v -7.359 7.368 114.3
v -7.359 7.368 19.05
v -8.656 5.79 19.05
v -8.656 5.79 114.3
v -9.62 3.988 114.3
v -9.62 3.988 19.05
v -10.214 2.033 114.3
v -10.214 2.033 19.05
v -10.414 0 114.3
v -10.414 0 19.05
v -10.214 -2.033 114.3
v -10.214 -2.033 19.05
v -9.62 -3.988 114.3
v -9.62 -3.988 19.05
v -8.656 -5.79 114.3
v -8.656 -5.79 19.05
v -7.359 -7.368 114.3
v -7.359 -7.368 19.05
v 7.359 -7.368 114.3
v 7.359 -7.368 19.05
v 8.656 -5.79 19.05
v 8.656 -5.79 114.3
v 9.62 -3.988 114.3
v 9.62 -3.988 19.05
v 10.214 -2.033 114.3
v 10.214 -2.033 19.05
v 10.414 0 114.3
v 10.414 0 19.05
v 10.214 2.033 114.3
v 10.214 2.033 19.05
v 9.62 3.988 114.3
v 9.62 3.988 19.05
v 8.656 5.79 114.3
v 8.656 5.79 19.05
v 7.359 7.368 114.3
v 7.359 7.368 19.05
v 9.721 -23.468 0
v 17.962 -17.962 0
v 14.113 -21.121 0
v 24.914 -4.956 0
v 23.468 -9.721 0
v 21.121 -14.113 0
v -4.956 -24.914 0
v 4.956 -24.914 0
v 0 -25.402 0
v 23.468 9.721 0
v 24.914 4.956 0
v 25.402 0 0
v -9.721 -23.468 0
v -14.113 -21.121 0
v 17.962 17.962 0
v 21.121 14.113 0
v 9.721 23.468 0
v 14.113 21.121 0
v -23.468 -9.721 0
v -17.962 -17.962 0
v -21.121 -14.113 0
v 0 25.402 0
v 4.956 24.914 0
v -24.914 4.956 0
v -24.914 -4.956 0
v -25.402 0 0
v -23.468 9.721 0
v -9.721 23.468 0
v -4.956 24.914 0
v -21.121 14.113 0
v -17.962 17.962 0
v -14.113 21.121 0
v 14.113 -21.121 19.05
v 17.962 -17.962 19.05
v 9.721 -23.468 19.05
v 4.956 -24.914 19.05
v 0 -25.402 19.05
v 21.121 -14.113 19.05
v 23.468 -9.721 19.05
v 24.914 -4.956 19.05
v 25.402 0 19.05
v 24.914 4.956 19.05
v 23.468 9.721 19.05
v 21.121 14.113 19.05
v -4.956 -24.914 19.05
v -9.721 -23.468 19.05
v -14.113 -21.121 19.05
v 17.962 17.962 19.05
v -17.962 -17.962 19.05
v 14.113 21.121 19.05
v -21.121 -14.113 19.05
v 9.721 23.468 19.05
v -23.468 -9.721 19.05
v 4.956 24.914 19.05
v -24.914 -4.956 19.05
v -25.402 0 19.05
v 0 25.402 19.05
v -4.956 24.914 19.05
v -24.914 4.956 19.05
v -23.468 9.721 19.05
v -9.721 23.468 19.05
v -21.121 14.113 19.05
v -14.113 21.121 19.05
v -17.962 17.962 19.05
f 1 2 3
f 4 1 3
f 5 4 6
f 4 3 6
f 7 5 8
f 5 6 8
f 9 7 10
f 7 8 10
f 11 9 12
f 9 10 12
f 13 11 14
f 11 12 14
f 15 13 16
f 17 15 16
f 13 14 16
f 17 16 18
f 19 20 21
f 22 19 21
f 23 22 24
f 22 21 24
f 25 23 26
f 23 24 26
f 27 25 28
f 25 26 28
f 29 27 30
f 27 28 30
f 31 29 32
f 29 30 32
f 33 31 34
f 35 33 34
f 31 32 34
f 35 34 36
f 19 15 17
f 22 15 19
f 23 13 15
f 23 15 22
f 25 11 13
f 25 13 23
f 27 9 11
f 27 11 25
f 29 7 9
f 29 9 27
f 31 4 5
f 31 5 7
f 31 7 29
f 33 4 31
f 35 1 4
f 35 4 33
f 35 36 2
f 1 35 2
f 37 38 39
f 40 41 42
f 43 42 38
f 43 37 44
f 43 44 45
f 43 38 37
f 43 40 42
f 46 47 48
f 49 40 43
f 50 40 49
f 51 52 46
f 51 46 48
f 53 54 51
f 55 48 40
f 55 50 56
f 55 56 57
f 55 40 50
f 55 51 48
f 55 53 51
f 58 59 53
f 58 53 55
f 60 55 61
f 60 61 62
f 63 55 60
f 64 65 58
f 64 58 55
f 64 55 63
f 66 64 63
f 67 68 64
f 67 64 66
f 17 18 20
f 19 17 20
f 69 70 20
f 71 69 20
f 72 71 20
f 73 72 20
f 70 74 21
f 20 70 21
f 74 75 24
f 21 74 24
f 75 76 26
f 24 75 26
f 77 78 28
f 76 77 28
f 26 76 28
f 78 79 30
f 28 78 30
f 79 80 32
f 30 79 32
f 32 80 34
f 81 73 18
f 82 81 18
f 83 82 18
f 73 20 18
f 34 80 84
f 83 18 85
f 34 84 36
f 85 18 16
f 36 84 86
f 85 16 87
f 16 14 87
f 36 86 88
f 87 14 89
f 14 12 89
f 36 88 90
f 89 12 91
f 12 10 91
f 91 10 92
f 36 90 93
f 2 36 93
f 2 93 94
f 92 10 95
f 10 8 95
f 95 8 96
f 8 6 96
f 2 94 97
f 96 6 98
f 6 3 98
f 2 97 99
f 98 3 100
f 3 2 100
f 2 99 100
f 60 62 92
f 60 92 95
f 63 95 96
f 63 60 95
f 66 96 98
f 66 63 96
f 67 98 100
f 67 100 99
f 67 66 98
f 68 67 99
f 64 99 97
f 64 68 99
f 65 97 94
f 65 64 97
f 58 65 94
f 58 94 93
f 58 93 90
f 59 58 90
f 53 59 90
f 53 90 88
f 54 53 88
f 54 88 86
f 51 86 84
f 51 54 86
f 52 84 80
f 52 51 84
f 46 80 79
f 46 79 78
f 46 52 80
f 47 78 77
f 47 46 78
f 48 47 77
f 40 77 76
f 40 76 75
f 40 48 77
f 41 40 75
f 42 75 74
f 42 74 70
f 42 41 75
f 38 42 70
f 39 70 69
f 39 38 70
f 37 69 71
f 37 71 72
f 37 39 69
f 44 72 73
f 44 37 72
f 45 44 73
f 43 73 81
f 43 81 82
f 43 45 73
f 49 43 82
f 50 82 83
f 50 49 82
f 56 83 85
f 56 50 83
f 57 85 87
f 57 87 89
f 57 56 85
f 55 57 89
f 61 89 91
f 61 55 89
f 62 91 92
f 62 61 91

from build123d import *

# Parameters (mm, degrees)
BOSS_EXTRUDE1_DEPTH = 114.3
SKETCH3_R           = 25.401969389
BOSS_EXTRUDE2_DEPTH = 19.05


with BuildPart() as part:
    # Sketch1 → Boss-Extrude1 (new body)
    with BuildSketch(Plane.XY):
        with BuildLine():
            Line((-7.359452383, -7.368165079), (7.359452383, -7.368165079))
            ThreePointArc((7.359452383, -7.368165079), (10.414, 0), (7.359452383, 7.368165079))
            Line((7.359452383, 7.368165079), (-7.359452383, 7.368165079))
            ThreePointArc((-7.359452383, 7.368165079), (-10.414, 0), (-7.359452383, -7.368165079))
        make_face()
    extrude(amount=BOSS_EXTRUDE1_DEPTH)

    # Sketch3 → Boss-Extrude2 (add)
    with BuildSketch(Plane(origin=(0, 0, 0), x_dir=(-1, 0, 0), z_dir=(0, 0, -1))):
        Circle(SKETCH3_R)
    extrude(amount=-BOSS_EXTRUDE2_DEPTH)


solid = part.part
